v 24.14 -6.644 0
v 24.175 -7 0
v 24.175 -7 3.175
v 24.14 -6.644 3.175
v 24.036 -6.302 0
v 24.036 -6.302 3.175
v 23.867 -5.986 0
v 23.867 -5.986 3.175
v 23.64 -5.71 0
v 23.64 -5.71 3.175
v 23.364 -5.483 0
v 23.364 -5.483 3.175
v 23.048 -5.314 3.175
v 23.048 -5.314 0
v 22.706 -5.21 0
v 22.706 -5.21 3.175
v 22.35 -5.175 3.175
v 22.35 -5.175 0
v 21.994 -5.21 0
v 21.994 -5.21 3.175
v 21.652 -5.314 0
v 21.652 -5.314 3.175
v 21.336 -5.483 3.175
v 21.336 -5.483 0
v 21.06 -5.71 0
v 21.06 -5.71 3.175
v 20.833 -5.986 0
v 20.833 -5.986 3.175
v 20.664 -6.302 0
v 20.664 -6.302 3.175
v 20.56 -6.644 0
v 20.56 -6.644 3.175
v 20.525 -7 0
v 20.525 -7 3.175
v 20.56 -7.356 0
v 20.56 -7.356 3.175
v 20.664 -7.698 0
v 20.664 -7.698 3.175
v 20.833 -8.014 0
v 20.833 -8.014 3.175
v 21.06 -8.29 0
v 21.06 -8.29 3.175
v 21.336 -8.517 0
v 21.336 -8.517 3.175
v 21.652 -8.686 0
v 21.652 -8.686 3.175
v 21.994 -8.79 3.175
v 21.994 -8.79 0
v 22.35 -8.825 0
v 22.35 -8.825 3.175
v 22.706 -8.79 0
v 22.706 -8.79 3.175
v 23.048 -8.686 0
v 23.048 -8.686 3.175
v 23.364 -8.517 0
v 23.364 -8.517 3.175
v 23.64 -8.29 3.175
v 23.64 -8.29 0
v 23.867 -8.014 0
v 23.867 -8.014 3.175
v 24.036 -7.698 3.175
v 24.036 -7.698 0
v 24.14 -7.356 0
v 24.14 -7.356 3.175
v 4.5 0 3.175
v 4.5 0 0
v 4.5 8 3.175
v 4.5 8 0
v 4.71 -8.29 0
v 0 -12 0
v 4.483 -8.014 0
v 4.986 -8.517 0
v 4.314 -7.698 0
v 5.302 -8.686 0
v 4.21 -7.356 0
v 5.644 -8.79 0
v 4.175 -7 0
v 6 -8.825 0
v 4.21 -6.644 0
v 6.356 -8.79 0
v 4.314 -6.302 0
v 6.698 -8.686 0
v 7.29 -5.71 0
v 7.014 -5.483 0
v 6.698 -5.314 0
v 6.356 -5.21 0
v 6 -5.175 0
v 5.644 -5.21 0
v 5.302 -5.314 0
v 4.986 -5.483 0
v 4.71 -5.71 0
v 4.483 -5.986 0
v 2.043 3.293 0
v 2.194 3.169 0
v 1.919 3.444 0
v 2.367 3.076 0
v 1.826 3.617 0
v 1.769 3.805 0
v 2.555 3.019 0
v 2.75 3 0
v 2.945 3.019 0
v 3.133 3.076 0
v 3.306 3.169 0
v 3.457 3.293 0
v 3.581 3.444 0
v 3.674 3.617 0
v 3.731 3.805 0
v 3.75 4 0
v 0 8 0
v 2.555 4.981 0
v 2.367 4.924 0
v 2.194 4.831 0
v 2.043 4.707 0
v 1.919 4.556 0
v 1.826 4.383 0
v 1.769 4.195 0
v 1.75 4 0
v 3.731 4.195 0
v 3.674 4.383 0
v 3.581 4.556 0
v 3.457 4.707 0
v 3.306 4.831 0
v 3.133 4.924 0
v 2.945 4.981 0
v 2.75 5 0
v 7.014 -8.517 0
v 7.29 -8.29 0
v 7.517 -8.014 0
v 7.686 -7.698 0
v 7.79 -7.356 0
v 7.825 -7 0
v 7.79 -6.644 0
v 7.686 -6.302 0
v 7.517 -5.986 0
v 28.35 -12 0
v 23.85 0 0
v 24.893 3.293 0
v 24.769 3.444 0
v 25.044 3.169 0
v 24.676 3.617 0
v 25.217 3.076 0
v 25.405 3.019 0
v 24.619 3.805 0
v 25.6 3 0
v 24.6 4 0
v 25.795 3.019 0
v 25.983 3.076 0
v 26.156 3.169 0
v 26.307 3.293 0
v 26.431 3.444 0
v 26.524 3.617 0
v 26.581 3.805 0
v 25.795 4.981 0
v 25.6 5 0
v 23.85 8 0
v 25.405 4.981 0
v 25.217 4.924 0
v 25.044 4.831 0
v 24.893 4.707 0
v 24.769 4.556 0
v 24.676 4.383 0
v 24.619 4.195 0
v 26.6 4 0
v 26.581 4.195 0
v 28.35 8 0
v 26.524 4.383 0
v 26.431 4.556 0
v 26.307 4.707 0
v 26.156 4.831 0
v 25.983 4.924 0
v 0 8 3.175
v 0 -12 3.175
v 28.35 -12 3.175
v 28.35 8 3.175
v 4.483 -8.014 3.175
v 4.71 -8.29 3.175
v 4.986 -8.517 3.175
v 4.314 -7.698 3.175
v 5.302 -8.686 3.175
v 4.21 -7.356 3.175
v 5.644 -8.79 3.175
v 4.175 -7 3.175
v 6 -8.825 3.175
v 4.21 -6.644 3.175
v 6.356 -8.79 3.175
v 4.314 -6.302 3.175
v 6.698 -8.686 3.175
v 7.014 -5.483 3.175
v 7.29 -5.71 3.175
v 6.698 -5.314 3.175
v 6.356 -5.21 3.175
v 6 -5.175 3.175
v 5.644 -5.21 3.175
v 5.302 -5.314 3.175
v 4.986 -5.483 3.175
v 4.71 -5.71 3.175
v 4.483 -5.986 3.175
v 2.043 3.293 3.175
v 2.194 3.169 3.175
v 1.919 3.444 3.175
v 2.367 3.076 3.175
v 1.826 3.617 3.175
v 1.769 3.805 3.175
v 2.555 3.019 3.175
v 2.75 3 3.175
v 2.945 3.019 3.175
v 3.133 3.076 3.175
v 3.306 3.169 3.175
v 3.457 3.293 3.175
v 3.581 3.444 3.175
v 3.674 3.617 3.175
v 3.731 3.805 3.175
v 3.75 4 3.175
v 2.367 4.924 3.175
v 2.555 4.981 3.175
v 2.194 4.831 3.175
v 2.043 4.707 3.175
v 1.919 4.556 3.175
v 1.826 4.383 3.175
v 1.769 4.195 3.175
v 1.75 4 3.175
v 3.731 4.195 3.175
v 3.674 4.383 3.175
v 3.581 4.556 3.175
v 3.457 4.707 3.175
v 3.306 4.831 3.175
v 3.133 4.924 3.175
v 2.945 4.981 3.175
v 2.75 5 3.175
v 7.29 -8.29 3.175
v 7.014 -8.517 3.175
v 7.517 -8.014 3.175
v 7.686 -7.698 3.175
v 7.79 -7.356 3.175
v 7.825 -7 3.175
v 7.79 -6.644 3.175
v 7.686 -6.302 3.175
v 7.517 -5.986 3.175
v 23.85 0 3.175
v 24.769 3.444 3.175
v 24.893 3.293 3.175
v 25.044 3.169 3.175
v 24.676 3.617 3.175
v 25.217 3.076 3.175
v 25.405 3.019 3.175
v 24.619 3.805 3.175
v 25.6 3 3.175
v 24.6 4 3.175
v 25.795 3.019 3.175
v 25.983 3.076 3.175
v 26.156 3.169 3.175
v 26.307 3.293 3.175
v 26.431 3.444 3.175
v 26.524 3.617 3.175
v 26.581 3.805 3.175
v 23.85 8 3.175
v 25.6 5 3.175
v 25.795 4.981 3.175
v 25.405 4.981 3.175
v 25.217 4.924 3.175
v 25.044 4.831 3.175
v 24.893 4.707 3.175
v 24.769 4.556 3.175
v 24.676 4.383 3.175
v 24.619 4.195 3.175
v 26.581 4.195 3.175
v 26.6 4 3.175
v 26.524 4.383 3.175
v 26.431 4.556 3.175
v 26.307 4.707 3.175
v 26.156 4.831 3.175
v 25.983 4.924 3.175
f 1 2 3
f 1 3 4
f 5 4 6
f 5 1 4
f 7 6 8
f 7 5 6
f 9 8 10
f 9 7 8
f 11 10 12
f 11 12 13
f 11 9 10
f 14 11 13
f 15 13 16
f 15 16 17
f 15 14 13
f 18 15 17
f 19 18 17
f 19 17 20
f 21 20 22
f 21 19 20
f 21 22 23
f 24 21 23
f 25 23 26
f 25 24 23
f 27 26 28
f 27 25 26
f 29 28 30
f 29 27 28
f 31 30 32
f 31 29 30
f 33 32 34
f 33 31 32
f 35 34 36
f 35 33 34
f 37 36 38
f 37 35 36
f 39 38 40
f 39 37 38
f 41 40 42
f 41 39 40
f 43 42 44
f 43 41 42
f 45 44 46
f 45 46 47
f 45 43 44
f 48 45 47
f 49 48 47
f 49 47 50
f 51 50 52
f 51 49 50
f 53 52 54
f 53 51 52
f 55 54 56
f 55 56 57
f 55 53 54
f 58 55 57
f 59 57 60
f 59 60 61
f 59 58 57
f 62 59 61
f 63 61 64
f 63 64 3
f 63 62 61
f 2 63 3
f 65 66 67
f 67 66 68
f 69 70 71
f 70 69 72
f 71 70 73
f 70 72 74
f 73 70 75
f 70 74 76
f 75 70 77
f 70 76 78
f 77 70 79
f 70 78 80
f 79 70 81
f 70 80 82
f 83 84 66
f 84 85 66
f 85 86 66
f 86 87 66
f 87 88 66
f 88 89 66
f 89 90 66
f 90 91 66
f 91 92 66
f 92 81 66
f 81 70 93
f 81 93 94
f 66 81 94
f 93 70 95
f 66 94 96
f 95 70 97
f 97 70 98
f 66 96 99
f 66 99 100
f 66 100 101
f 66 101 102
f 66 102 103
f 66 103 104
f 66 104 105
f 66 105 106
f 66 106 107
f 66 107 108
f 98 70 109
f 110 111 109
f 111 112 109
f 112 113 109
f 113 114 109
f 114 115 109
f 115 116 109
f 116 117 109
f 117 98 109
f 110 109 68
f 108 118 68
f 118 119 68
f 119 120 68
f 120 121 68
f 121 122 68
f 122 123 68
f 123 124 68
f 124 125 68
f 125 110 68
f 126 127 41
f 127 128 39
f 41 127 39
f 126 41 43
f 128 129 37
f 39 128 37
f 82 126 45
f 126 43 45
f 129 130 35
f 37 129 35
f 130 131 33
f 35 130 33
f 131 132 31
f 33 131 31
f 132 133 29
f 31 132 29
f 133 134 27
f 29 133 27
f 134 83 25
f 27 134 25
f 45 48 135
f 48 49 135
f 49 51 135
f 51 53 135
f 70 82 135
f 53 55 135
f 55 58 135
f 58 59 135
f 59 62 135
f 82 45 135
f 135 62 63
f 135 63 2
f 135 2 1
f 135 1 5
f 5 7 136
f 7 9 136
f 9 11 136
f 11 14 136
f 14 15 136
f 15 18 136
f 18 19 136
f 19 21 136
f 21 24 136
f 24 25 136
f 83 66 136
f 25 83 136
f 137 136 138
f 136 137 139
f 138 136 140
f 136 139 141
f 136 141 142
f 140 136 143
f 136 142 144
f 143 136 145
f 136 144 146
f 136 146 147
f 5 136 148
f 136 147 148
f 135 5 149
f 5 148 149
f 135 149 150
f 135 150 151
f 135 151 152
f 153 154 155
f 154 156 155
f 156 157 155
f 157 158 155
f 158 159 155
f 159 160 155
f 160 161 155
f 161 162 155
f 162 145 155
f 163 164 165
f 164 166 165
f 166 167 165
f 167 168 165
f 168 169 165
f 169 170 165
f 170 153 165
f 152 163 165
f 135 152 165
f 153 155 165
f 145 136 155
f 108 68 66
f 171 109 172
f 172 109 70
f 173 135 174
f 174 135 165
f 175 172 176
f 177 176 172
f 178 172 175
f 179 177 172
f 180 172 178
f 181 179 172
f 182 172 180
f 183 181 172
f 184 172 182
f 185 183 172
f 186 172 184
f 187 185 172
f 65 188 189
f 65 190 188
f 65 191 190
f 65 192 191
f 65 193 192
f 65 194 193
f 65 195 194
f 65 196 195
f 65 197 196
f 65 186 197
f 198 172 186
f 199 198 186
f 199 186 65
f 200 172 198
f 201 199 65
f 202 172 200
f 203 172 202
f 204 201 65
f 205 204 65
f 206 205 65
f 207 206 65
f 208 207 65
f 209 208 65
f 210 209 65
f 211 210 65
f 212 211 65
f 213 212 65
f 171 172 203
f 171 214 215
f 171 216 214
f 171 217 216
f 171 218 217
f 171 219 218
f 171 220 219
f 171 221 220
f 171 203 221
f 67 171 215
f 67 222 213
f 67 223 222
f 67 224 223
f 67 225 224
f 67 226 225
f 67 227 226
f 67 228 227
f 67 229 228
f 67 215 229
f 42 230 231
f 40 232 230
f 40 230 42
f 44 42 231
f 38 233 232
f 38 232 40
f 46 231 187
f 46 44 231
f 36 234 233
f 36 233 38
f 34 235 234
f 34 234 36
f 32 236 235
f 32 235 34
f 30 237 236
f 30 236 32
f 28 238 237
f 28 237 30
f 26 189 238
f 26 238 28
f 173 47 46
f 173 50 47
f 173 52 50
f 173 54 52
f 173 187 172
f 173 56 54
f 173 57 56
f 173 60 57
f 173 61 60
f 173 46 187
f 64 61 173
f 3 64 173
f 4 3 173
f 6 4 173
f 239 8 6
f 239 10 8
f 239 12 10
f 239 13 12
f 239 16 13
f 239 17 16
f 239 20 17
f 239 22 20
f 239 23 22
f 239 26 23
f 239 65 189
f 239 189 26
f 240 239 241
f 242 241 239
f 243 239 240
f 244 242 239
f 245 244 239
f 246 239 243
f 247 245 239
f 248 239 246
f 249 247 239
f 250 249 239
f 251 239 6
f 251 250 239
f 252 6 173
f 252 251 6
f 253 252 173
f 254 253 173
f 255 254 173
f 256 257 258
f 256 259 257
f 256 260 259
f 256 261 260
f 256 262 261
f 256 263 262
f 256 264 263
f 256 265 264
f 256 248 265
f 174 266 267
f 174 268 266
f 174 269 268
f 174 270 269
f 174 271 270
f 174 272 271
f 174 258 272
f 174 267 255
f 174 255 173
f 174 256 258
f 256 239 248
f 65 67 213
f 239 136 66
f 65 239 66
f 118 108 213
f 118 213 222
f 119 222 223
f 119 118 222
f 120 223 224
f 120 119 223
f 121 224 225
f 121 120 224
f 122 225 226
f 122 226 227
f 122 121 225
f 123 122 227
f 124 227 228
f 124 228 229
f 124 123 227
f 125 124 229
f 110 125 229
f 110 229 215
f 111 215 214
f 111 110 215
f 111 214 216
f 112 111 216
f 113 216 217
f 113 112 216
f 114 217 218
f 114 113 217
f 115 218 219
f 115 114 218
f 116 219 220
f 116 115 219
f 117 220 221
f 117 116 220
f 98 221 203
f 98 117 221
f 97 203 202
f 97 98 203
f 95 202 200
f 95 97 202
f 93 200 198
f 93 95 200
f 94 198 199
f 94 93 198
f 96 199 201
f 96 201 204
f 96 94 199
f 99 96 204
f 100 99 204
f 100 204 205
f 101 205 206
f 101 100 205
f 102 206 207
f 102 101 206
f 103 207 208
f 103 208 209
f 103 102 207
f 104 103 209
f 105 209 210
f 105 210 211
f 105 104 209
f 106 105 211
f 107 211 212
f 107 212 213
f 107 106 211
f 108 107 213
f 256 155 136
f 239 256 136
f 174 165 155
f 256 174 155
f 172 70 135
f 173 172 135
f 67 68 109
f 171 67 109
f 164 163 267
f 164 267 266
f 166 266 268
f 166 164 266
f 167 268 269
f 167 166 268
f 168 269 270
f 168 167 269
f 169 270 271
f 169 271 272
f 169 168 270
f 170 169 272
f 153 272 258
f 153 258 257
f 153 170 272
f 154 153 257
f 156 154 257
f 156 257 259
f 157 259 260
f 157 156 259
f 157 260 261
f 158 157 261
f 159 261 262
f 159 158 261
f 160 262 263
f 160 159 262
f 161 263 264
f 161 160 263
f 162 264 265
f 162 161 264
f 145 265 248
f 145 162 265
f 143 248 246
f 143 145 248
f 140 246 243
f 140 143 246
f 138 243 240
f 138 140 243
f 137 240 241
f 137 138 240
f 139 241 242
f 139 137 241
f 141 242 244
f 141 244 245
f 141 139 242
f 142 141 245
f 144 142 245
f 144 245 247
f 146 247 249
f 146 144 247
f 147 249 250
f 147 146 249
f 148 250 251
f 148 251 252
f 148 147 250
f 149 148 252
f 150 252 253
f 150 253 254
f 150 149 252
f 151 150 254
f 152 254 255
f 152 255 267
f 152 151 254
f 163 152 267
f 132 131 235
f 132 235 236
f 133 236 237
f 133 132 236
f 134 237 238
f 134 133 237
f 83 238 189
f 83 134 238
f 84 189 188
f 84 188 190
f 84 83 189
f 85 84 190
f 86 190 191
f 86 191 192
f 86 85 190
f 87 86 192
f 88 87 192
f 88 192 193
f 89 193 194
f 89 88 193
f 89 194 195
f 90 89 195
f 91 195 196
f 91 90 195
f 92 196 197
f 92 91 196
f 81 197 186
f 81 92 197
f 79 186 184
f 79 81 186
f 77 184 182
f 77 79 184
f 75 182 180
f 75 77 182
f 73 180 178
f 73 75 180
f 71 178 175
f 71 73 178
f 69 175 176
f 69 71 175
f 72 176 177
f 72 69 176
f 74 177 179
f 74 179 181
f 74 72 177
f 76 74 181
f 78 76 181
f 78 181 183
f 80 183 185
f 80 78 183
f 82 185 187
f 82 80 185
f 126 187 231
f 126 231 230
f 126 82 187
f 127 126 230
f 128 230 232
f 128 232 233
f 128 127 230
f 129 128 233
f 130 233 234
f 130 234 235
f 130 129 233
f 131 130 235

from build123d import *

# Parameters (mm, degrees)
SKETCH1_R           = 1
SKETCH1_R_2         = 1.825
BOSS_EXTRUDE1_DEPTH = 3.175


with BuildPart() as part:
    # Sketch1 → Boss-Extrude1 (new body)
    with BuildSketch(Plane.XY):
        Polygon((0, 8), (0, 0), (0, -12), (28.35, -12), (28.35, 8), (23.85, 8), (23.85, 0), (4.5, 0), (4.5, 8), align=None)
        with Locations((2.75, 4)):
            Circle(SKETCH1_R, mode=Mode.SUBTRACT)
        with Locations((25.6, 4)):
            Circle(SKETCH1_R, mode=Mode.SUBTRACT)
        with Locations((6, -7)):
            Circle(SKETCH1_R_2, mode=Mode.SUBTRACT)
        with Locations((22.35, -7)):
            Circle(SKETCH1_R_2, mode=Mode.SUBTRACT)
    extrude(amount=BOSS_EXTRUDE1_DEPTH)


solid = part.part
